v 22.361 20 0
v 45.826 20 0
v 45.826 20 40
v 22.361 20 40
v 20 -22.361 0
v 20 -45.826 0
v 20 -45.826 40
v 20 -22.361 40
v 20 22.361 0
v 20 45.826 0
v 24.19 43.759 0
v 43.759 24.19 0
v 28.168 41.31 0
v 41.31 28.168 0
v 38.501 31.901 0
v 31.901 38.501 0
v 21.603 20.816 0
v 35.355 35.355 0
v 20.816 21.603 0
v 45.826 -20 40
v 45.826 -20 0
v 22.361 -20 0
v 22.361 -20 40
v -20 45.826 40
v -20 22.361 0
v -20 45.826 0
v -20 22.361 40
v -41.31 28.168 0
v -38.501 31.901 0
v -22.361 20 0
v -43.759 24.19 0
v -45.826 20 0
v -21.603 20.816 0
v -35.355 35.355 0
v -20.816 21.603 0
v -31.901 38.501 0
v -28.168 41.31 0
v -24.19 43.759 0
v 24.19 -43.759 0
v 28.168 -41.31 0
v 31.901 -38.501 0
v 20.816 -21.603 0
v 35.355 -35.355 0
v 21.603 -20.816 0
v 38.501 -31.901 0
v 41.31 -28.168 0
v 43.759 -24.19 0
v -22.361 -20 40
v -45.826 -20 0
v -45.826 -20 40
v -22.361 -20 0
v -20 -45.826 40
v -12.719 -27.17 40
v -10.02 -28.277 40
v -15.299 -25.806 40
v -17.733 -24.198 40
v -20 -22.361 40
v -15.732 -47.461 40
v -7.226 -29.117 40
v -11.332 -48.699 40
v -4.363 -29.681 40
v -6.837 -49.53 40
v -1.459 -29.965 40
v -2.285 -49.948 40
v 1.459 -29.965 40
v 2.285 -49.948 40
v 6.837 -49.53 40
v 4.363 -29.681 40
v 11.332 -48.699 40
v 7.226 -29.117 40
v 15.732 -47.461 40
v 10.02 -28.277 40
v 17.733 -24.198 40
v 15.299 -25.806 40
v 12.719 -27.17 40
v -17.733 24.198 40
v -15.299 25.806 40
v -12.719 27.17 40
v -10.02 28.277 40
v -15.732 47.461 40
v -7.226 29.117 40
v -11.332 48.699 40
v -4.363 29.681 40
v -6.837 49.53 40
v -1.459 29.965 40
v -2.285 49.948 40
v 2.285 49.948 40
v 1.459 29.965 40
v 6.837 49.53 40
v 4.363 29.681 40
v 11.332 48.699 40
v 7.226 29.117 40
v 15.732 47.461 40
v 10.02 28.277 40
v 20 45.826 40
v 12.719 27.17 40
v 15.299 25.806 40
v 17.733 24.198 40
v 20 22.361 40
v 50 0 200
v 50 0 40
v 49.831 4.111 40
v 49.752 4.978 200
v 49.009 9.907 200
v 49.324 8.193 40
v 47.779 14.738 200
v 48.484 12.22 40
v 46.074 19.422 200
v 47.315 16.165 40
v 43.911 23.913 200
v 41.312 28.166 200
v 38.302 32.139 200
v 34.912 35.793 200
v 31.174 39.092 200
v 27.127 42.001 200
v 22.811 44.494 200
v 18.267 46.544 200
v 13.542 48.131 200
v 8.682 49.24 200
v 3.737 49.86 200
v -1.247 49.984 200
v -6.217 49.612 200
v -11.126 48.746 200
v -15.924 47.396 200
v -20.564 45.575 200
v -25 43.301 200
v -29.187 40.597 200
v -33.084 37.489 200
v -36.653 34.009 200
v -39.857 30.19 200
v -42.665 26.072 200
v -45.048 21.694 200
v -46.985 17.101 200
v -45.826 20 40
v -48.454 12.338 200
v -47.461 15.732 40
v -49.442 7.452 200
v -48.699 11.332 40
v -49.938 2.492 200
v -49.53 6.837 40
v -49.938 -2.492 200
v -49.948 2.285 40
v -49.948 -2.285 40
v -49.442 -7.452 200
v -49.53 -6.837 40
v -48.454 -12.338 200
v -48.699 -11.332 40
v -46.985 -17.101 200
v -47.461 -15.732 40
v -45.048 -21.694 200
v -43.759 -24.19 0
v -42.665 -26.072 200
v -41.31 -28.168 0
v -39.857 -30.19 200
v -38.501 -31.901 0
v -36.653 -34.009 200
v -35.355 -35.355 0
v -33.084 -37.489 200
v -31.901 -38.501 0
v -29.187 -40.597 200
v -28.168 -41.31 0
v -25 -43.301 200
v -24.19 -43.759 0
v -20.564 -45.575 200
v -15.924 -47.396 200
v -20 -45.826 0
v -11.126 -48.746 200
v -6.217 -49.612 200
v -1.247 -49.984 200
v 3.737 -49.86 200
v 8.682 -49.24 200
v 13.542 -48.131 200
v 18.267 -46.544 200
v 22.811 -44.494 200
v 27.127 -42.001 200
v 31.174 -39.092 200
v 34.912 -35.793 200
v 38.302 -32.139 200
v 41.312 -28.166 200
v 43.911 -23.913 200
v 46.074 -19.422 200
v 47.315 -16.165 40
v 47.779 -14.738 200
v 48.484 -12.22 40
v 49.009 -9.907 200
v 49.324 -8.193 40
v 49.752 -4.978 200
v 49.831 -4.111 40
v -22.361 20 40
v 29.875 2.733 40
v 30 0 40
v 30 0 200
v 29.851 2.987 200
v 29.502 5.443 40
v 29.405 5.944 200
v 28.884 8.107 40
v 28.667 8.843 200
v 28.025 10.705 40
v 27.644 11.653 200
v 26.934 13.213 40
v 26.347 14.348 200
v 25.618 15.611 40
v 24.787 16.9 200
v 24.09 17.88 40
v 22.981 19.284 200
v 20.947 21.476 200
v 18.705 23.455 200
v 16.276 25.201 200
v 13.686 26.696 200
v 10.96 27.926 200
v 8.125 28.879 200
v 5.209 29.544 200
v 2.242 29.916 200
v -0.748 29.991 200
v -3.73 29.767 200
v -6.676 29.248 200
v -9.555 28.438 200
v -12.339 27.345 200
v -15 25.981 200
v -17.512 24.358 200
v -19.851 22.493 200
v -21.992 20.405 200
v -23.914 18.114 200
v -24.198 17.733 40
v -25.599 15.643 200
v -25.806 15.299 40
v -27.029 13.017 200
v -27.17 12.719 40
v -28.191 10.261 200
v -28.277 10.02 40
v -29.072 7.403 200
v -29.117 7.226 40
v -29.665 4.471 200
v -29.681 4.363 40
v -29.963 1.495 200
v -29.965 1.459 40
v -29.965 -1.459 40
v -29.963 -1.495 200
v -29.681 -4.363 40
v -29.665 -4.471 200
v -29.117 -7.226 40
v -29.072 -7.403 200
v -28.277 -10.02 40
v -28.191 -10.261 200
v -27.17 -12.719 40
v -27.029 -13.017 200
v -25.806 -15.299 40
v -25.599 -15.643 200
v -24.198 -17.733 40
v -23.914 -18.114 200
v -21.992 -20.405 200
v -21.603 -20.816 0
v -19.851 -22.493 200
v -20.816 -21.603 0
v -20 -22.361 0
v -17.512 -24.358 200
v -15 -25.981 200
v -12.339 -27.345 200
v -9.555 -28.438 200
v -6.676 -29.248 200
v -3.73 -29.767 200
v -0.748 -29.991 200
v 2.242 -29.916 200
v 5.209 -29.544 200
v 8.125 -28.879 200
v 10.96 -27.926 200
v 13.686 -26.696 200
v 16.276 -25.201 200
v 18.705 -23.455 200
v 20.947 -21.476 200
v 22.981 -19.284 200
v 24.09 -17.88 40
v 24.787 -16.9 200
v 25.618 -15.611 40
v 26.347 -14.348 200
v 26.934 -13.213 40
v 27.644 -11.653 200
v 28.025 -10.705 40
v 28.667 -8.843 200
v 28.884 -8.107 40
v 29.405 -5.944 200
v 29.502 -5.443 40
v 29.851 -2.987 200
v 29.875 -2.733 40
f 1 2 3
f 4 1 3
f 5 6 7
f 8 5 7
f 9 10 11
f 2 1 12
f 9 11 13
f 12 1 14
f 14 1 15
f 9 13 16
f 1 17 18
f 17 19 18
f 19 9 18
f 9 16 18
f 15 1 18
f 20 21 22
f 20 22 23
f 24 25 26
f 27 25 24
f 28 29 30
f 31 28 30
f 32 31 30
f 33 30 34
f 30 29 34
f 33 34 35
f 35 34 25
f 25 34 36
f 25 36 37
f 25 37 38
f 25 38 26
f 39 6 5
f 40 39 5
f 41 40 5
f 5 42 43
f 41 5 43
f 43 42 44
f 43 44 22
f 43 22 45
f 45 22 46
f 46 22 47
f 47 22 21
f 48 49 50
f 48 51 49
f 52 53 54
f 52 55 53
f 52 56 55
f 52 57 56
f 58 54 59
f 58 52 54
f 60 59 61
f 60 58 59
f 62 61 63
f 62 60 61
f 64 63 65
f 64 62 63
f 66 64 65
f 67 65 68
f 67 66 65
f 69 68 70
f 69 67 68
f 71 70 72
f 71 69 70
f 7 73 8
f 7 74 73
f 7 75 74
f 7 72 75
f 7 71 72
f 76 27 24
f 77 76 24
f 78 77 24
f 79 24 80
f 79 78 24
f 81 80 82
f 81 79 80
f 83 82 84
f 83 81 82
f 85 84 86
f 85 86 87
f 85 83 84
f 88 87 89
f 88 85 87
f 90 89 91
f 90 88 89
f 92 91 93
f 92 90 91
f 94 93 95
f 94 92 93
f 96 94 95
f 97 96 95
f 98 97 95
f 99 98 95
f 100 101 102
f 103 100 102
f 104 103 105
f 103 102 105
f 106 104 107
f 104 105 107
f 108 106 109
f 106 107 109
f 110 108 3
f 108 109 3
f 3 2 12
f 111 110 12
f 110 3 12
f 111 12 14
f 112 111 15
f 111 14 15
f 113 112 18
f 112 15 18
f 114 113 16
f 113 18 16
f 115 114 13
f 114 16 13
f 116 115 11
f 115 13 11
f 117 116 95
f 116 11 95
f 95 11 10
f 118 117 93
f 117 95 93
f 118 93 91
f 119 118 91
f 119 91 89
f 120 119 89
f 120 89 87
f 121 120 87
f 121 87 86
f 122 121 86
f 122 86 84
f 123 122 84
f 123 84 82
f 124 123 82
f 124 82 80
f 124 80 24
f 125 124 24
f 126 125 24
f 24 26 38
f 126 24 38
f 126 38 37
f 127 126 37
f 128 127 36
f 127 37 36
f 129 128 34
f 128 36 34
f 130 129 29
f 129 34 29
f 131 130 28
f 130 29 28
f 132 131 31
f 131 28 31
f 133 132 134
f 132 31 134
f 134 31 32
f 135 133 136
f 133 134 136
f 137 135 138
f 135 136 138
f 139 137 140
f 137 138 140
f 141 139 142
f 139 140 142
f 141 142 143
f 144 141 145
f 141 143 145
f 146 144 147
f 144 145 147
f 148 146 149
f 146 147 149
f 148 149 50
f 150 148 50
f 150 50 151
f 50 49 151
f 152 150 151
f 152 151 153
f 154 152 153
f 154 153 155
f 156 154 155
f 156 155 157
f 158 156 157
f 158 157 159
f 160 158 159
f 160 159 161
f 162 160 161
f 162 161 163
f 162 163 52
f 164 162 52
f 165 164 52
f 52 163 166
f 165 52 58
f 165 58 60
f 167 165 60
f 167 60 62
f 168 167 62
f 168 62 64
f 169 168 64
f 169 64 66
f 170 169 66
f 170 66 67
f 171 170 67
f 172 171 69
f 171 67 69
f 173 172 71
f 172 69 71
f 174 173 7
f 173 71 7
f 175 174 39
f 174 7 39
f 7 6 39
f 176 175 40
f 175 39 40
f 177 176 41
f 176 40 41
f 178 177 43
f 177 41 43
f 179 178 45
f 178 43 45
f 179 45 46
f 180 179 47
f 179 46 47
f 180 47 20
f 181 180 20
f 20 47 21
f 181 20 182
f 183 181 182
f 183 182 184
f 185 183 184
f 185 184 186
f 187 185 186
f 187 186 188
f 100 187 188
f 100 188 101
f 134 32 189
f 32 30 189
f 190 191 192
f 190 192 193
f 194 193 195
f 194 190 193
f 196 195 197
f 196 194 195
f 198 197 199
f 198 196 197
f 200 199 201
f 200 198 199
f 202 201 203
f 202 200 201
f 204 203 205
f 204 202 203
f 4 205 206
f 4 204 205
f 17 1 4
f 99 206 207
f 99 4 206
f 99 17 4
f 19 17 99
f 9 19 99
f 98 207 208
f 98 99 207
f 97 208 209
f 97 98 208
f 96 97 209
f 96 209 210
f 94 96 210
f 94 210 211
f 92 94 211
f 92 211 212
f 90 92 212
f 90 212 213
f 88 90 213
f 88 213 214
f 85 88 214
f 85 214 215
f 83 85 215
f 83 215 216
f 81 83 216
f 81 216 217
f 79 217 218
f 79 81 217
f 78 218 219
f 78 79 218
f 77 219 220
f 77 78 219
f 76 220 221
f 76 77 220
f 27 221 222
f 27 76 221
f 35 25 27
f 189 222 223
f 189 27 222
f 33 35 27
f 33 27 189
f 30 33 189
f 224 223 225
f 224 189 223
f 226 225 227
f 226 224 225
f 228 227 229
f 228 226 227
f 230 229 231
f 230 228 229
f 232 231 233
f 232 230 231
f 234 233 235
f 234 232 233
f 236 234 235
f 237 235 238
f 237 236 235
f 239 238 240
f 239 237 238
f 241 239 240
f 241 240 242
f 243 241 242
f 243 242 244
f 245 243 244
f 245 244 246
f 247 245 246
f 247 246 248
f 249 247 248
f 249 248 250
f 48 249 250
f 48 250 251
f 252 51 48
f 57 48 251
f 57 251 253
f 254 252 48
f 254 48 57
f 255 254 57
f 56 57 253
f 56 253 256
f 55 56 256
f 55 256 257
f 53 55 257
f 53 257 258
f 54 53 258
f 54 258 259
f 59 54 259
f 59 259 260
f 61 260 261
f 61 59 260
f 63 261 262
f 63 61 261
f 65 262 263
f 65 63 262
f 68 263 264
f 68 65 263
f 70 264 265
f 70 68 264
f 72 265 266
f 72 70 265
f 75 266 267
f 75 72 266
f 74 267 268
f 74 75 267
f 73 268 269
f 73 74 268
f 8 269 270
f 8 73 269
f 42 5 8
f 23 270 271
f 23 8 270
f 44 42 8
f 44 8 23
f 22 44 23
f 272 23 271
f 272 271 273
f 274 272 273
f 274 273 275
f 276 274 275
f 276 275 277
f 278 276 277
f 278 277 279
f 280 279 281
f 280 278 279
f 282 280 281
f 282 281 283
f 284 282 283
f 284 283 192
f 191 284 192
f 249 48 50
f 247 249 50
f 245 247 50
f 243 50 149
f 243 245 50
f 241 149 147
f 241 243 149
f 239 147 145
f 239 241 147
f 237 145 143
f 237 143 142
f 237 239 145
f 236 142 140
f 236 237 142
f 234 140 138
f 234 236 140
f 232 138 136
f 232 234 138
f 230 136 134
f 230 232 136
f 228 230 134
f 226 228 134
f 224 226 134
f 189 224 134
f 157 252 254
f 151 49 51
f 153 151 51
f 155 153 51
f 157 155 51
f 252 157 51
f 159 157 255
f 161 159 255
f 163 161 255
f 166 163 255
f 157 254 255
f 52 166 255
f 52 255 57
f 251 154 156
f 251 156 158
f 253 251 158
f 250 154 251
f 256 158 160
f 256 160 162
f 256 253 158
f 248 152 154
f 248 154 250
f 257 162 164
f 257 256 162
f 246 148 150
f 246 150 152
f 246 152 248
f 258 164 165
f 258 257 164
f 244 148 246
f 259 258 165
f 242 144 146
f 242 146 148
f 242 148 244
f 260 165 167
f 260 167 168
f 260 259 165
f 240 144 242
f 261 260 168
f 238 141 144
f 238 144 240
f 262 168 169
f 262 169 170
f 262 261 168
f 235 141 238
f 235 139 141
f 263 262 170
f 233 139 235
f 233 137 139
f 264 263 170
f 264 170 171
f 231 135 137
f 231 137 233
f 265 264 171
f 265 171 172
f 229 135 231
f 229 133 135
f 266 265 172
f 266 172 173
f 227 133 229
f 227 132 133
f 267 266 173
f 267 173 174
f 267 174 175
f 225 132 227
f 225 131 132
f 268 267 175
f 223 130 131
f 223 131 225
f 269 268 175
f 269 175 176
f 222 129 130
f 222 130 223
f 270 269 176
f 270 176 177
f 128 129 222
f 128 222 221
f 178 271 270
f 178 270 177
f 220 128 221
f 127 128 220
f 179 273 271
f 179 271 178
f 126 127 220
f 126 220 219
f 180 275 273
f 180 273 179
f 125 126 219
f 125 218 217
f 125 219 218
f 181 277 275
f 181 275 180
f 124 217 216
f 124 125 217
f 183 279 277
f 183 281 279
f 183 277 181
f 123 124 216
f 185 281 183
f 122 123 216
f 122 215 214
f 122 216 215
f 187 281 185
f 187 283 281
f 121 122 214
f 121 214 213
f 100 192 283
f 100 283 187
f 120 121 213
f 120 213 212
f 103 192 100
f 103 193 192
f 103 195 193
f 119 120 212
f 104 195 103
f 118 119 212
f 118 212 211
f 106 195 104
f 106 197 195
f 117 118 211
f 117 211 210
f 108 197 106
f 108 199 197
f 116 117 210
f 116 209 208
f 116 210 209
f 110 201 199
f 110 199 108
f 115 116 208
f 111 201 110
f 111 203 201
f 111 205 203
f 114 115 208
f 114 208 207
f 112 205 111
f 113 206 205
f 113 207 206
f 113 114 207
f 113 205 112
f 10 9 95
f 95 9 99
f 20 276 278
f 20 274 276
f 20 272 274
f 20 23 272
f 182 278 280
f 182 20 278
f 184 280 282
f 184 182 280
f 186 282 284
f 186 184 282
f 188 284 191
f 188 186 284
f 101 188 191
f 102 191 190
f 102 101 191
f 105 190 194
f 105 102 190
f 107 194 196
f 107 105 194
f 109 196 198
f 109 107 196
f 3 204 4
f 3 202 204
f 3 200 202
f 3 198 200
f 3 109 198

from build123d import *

# Parameters (mm, degrees)
F0_R     = 50
F0_R_2   = 30
F1_DEPTH = 200
F2_W     = 40
F2_H     = 80
F3_DEPTH = 4950
F4_W     = 40
F4_H     = 80
F5_DEPTH = 2839


with BuildPart() as f1:
    # F0 (on Top) → F1 (new body)
    with BuildSketch(Plane.XY):
        Circle(F0_R)
        Circle(F0_R_2, mode=Mode.SUBTRACT)
    extrude(amount=F1_DEPTH)

    # F2 (on Front) → F3 (cut, symmetric)
    with BuildSketch(Plane.XZ):
        Rectangle(F2_W, F2_H)
    extrude(amount=F3_DEPTH, both=True, mode=Mode.SUBTRACT)

    # F4 (on Right) → F5 (cut, symmetric)
    with BuildSketch(Plane.YZ):
        Rectangle(F4_W, F4_H)
    extrude(amount=F5_DEPTH, both=True, mode=Mode.SUBTRACT)


solid = f1.part
